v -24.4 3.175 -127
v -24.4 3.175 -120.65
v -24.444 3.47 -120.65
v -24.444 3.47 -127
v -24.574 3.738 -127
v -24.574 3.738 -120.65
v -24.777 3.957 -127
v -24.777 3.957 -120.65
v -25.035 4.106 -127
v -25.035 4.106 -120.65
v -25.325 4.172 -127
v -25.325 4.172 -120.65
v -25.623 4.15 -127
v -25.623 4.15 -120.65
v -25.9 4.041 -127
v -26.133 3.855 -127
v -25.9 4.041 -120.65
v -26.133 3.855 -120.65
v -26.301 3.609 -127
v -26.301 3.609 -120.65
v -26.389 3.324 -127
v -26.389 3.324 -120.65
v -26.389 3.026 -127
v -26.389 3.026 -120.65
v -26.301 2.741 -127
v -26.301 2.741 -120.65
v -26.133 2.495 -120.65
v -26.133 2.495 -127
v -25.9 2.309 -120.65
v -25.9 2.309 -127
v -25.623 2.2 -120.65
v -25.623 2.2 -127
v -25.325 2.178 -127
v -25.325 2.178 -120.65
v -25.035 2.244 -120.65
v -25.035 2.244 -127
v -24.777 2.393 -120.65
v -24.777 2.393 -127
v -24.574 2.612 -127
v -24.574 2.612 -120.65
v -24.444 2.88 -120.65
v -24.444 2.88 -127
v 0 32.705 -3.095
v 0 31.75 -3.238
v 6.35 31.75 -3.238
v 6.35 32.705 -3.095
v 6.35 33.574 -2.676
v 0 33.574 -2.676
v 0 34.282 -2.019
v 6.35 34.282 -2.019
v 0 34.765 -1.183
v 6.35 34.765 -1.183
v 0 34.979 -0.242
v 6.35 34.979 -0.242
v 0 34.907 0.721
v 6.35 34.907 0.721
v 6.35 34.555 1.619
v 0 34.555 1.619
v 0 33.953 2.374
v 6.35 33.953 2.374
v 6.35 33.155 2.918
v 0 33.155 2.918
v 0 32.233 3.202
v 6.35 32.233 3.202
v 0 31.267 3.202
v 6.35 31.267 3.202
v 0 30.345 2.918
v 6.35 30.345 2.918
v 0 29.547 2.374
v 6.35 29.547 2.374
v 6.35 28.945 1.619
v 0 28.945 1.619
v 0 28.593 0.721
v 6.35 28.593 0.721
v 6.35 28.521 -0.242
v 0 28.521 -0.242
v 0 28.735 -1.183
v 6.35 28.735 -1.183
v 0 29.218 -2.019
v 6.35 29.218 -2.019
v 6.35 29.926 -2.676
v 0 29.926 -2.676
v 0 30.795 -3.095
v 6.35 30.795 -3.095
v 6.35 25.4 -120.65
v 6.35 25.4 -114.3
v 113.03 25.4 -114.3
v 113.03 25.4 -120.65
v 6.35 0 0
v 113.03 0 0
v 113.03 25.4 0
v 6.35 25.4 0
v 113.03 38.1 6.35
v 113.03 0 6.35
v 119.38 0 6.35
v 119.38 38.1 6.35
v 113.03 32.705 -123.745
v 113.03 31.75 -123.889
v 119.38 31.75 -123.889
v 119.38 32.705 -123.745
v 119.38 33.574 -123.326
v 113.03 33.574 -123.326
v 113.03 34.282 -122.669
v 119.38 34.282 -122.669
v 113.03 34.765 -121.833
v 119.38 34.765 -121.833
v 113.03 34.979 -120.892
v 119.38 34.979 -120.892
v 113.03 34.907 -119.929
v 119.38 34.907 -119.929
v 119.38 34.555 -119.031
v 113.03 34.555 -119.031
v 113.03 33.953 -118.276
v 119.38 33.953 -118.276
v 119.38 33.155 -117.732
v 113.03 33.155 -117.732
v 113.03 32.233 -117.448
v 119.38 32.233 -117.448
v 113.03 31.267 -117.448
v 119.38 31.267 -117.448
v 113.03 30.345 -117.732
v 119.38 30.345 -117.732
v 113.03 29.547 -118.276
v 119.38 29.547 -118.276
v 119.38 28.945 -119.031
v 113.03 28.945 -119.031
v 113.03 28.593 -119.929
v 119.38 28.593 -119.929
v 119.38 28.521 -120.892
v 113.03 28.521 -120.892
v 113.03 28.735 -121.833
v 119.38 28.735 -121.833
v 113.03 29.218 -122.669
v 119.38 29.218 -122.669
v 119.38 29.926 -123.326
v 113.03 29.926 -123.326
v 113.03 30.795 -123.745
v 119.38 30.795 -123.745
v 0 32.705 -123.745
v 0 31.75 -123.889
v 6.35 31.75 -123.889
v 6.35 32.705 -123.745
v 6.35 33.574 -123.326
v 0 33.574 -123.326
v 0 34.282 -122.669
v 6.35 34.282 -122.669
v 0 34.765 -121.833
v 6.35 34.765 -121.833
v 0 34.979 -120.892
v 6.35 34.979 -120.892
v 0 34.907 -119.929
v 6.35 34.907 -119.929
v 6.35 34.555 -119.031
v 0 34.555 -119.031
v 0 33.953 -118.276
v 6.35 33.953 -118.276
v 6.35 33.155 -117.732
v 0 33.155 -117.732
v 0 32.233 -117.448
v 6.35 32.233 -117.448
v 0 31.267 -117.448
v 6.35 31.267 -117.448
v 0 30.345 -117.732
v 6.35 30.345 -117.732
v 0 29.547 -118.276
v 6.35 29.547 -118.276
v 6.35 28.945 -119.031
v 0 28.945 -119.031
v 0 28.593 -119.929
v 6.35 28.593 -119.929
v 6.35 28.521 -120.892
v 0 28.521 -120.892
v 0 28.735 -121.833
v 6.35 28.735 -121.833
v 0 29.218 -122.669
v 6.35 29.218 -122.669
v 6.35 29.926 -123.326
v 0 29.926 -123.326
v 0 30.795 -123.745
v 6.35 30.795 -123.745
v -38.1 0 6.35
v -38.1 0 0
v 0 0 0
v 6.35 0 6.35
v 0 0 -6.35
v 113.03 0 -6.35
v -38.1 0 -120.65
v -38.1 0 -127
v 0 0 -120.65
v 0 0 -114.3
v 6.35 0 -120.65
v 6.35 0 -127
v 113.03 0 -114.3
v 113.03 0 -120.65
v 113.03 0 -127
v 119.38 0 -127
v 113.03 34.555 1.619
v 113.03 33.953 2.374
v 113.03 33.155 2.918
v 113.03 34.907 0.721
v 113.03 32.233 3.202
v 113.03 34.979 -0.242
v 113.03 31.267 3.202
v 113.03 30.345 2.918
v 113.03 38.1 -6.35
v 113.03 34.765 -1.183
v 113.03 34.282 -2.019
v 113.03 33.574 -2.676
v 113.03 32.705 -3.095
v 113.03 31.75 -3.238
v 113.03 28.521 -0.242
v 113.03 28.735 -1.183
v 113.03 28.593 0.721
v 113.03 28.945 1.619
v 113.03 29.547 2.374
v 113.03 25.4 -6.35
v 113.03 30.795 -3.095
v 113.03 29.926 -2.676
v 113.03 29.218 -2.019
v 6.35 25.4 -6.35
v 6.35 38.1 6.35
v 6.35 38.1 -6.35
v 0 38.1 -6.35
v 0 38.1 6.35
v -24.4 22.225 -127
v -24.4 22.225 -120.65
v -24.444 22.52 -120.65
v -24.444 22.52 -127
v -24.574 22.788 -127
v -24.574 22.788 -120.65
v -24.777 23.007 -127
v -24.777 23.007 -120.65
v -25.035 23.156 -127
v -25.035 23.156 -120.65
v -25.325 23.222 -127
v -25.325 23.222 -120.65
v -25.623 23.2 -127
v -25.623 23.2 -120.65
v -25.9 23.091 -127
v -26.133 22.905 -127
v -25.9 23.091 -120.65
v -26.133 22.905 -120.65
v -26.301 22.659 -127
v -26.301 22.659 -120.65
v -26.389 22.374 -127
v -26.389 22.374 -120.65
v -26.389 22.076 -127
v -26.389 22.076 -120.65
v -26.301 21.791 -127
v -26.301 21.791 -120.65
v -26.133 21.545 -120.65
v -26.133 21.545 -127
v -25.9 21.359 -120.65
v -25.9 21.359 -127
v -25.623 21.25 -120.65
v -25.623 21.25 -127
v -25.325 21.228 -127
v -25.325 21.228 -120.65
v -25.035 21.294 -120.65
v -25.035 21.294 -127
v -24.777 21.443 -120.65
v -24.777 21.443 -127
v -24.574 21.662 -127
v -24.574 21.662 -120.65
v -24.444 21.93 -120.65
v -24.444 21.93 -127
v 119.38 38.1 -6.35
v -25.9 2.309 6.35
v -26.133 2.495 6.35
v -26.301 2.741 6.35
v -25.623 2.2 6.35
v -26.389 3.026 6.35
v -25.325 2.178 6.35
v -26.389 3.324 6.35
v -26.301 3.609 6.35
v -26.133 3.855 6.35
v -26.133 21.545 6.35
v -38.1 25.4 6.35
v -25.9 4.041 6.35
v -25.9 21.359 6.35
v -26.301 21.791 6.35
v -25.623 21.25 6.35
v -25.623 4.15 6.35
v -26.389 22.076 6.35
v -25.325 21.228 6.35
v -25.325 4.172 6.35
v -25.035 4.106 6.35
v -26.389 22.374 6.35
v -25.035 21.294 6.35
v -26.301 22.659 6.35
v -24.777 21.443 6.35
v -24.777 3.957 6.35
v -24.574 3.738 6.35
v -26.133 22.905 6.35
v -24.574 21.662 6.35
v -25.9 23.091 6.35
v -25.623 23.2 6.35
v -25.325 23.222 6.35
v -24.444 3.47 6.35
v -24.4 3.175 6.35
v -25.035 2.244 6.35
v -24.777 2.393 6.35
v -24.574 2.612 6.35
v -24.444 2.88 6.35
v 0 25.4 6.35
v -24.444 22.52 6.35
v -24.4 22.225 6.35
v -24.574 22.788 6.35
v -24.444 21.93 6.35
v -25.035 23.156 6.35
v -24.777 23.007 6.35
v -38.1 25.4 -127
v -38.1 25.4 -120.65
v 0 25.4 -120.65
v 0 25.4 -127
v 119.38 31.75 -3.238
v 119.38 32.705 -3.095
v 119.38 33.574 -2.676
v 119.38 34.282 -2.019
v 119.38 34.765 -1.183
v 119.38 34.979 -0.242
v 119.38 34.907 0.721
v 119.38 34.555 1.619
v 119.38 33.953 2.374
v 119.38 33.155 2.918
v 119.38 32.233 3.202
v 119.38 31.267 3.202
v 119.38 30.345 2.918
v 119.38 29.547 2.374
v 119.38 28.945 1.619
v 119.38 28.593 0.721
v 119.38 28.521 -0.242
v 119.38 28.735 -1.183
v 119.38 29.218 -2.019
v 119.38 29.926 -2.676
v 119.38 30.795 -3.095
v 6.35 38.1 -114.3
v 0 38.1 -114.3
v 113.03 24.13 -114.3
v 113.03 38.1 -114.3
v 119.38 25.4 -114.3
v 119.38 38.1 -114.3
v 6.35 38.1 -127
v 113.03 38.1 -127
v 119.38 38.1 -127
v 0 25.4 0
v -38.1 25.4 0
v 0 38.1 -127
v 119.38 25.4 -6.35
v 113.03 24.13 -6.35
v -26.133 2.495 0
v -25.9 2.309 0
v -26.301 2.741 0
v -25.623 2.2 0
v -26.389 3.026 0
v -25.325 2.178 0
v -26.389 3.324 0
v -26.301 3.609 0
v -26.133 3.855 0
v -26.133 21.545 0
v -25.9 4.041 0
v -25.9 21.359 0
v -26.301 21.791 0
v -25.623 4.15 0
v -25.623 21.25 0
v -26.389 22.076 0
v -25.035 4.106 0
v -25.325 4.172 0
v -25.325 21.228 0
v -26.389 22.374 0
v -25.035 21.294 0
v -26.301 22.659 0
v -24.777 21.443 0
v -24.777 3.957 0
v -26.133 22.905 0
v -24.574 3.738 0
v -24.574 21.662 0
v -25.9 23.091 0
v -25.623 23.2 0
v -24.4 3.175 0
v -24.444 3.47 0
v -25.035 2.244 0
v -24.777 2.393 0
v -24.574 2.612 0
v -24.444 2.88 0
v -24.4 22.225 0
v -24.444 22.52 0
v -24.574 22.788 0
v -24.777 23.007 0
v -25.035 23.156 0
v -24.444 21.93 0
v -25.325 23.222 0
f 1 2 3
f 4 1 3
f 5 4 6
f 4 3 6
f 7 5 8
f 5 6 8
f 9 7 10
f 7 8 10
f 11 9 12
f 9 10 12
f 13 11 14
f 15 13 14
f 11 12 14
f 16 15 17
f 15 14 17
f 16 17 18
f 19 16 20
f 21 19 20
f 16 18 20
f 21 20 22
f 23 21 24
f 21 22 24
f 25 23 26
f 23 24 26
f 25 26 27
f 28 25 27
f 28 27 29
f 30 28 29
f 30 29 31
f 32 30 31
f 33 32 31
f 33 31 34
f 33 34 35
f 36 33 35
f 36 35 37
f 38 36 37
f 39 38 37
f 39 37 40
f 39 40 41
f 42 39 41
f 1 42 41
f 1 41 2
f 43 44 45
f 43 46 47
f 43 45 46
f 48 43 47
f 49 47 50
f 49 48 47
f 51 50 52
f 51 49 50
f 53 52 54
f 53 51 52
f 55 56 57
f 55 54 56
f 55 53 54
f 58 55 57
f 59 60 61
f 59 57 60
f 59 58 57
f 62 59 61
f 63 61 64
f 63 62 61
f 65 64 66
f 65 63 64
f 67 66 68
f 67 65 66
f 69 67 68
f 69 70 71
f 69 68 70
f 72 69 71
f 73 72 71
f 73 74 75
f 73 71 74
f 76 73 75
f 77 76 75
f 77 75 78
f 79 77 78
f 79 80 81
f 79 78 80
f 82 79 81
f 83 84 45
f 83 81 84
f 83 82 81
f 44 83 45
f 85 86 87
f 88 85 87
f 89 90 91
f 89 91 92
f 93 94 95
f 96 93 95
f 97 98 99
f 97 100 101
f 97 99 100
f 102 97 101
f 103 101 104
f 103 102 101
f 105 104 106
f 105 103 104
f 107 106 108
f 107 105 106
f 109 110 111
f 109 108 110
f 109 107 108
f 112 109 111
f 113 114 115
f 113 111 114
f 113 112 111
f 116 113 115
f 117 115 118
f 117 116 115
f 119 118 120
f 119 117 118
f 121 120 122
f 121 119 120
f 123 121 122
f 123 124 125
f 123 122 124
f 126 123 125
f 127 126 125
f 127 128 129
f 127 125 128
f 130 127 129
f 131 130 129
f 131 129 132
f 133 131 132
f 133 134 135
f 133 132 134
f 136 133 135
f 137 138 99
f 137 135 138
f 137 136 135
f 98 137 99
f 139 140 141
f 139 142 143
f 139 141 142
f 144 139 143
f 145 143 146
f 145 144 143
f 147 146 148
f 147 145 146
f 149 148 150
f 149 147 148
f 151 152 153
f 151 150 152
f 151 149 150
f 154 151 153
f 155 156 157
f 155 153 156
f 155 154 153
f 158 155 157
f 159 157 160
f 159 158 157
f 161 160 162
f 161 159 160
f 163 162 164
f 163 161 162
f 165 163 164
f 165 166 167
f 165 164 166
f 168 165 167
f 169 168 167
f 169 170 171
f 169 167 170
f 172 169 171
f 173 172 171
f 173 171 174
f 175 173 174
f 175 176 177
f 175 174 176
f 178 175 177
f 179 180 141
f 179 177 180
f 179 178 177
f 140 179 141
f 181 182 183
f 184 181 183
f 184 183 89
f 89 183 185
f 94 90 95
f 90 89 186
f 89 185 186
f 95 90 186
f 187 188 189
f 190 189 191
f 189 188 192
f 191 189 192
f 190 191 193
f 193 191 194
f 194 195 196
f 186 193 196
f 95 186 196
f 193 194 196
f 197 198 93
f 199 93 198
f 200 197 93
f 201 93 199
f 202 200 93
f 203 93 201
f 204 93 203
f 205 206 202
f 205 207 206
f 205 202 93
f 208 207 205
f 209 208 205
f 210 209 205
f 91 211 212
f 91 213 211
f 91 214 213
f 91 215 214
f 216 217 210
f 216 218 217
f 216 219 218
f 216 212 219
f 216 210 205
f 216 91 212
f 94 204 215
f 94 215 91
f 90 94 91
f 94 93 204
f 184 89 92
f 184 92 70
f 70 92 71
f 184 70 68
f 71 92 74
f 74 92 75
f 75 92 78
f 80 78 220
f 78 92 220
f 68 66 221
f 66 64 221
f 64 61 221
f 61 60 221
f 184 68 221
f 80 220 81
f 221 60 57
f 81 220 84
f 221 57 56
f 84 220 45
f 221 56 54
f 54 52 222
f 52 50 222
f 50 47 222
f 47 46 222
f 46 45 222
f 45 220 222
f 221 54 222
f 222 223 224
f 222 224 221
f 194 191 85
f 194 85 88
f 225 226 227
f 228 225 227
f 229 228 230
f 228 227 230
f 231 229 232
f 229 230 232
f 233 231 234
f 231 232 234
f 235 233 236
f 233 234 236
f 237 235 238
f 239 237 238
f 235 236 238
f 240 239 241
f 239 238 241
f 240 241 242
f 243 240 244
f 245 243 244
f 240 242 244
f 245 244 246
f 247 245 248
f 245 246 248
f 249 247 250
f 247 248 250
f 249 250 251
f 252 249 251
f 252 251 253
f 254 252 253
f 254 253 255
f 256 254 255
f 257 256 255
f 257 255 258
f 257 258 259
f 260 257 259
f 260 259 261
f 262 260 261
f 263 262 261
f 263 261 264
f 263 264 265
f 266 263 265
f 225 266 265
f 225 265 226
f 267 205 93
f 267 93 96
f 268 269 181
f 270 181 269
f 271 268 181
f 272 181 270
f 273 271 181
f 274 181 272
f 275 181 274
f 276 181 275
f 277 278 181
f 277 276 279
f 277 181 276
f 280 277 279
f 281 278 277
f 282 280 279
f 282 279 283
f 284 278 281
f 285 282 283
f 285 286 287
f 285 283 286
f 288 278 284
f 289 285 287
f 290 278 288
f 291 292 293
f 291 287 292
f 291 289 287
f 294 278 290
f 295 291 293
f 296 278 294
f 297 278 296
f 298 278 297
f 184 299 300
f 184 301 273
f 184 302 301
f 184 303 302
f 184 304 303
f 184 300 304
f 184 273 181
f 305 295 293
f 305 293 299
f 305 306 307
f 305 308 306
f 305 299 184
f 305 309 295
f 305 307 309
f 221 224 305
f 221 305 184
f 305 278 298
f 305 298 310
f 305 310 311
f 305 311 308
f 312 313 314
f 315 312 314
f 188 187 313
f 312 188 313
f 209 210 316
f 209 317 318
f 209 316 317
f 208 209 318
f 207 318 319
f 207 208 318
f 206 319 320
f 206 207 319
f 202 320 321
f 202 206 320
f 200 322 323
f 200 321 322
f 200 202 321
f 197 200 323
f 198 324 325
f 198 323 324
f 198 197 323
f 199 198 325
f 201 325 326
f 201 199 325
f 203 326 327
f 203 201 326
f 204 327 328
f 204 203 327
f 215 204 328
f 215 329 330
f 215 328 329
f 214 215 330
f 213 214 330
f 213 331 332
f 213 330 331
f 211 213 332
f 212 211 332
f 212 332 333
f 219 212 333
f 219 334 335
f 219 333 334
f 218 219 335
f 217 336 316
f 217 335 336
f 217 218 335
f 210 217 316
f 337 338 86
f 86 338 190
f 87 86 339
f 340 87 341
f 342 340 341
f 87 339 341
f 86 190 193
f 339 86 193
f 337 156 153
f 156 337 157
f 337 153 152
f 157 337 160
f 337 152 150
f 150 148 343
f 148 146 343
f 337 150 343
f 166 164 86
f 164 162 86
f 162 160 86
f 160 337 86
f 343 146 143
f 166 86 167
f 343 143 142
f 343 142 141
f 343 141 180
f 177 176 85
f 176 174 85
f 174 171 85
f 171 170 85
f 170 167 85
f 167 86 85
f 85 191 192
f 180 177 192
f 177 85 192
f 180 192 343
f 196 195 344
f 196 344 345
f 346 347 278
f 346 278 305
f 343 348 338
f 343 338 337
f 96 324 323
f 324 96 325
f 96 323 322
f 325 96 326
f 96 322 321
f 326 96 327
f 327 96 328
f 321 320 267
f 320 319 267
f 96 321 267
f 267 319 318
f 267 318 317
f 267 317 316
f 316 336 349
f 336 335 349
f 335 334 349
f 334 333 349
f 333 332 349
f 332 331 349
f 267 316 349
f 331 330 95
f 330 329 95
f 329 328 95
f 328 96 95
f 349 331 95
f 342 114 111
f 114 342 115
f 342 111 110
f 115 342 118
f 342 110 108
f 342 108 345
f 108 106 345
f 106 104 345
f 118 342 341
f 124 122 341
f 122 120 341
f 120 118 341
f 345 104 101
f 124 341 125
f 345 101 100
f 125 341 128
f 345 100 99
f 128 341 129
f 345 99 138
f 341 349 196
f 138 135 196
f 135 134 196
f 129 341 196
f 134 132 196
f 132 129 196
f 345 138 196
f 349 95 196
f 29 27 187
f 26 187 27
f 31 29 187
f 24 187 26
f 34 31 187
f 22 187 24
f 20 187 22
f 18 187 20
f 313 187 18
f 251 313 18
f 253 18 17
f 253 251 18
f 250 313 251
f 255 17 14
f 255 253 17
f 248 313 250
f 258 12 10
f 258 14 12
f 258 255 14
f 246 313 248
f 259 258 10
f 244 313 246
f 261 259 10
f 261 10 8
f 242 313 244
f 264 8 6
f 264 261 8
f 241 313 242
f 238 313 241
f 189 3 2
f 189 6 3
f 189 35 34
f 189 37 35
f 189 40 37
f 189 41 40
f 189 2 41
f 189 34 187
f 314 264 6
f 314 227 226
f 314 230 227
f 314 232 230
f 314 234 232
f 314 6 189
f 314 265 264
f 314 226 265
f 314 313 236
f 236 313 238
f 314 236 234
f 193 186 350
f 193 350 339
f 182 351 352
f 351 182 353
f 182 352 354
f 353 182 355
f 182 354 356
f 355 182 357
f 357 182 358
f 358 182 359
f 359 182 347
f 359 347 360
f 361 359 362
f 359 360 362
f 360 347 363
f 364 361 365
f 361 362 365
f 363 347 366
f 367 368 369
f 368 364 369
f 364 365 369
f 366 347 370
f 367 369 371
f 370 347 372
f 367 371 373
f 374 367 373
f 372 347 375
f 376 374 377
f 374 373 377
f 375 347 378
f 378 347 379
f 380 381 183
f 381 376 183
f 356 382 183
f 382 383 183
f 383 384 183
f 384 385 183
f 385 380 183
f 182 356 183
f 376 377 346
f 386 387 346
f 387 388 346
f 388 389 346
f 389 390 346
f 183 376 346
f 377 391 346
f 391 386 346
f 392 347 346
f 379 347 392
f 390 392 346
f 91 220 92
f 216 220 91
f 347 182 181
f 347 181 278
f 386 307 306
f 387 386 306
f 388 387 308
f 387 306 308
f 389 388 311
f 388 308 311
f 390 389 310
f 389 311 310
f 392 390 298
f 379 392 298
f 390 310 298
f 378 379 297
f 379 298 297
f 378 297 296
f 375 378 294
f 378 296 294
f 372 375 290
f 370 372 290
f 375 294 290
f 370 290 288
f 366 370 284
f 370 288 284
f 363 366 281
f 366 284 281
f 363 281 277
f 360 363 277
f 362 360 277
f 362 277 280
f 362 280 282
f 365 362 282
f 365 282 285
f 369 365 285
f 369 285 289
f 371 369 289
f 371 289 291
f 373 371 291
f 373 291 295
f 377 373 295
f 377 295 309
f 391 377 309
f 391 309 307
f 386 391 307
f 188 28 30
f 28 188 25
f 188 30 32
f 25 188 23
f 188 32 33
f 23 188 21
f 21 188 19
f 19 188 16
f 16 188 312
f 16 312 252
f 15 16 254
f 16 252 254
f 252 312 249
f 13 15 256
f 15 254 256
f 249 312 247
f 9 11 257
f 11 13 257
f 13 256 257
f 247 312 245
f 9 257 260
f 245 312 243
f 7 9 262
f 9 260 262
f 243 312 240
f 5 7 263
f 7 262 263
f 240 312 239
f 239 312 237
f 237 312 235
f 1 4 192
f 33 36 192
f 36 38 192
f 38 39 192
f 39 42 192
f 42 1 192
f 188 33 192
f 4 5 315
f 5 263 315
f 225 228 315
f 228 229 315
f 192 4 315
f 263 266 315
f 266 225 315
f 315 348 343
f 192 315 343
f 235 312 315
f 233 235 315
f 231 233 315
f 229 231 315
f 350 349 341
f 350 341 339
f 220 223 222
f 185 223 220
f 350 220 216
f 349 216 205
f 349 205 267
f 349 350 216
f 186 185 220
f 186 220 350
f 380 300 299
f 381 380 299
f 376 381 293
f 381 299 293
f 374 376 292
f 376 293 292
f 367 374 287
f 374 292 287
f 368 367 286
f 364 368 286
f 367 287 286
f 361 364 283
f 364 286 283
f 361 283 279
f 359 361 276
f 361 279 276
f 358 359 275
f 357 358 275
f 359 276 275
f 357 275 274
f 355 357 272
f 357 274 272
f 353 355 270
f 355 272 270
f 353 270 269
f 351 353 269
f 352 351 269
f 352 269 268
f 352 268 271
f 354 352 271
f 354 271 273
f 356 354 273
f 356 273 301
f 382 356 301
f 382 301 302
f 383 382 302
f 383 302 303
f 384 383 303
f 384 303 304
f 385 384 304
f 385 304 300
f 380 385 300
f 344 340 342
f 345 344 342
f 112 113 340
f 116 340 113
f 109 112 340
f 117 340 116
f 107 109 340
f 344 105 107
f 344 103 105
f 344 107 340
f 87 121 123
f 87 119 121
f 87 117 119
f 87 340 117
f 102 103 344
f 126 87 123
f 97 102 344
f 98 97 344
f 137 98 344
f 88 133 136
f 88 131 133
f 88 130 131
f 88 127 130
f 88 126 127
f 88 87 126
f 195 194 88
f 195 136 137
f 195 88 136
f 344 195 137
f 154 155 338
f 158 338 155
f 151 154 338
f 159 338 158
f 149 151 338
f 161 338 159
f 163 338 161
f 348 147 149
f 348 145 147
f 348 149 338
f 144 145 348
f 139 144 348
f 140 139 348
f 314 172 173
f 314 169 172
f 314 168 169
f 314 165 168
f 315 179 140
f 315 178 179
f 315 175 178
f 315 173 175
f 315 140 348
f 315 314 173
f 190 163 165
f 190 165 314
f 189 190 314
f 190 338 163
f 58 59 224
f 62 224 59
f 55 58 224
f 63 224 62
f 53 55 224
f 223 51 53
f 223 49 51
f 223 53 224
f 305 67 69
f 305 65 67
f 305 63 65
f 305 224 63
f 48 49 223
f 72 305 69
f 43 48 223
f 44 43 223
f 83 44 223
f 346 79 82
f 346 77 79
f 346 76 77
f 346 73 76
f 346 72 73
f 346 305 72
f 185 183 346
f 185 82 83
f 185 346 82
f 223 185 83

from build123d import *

# Parameters (mm, degrees)
BOSS_EXTRUDE1_DEPTH     = 25.4
CUT_EXTRUDE1_START      = -6.35
CUT_EXTRUDE1_DEPTH      = 107.95
SKETCH3_W               = 44.45
SKETCH3_H               = 25.4
BOSS_EXTRUDE2_DEPTH     = 6.35
BOSS_EXTRUDE3_START     = -120.65
SKETCH3_2_W             = 44.45
SKETCH3_2_H             = 25.4
BOSS_EXTRUDE3_DEPTH     = 6.35
BOSS_EXTRUDE4_START     = -25.4
SKETCH8_W               = 6.35
SKETCH8_H               = 12.7
BOSS_EXTRUDE4_DEPTH     = 38.1
CUT_EXTRUDE2_DEPTH      = 206.865393886
CUT_EXTRUDE2_DEPTH_BACK = 206.865393886
SKETCH9_R               = 3.2385
SKETCH10_R              = 1.000000032
CUT_EXTRUDE3_DEPTH      = 183.990209847


with BuildPart() as part:
    # Sketch1 → Boss-Extrude1 (new body)
    with BuildSketch(Plane(origin=(0, 0, 0), x_dir=(1, 0, 0), z_dir=(0, 1, 0))):
        Polygon((3.175, 114.3), (0, 114.3), (0, 120.65), (119.38, 120.65), (119.38, 0), (0, 0), (0, 6.35), (3.175, 6.35), (113.03, 6.35), (113.03, 114.3), align=None)
    extrude(amount=BOSS_EXTRUDE1_DEPTH)

    # Sketch2 → Cut-Extrude1 (cut)
    with BuildSketch(Plane.XY.offset(CUT_EXTRUDE1_START)):
        Polygon((119.38, 25.4), (113.03, 24.13), (113.03, 25.4), align=None)
    extrude(amount=-CUT_EXTRUDE1_DEPTH, mode=Mode.SUBTRACT)

    # Sketch3 → Boss-Extrude2 (add)
    with BuildSketch(Plane.XY):
        with Locations((-15.875, 12.7)):
            Rectangle(SKETCH3_W, SKETCH3_H)
    extrude(amount=BOSS_EXTRUDE2_DEPTH)

    # Sketch3<2> → Boss-Extrude3 (add)
    with BuildSketch(Plane.XY.offset(BOSS_EXTRUDE3_START)):
        with Locations((-15.875, 12.7)):
            Rectangle(SKETCH3_2_W, SKETCH3_2_H)
    extrude(amount=-BOSS_EXTRUDE3_DEPTH)

    # Sketch8 → Boss-Extrude4 (add)
    with BuildSketch(Plane(origin=(0, 25.4, 0), x_dir=(1, 0, 0), z_dir=(0, 1, 0)).offset(BOSS_EXTRUDE4_START)):
        with Locations((116.205, 0)):
            Rectangle(SKETCH8_W, SKETCH8_H)
        with Locations((3.175, 0)):
            Rectangle(SKETCH8_W, SKETCH8_H)
        with Locations((3.175, 120.65)):
            Rectangle(SKETCH8_W, SKETCH8_H)
        with Locations((116.205, 120.65)):
            Rectangle(SKETCH8_W, SKETCH8_H)
    extrude(amount=BOSS_EXTRUDE4_DEPTH)

    # Sketch9 → Cut-Extrude2 (cut, two sides: drawn at the far end of the back side and taken through both)
    with BuildSketch(Plane(origin=(119.38, 0, 0), x_dir=(0, 0, -1), z_dir=(1, 0, 0)).offset(-CUT_EXTRUDE2_DEPTH_BACK)):
        with Locations((0, 31.75)):
            Circle(SKETCH9_R)
        with Locations((120.65, 31.75)):
            Circle(SKETCH9_R)
    extrude(amount=CUT_EXTRUDE2_DEPTH + CUT_EXTRUDE2_DEPTH_BACK, mode=Mode.SUBTRACT)

    # Sketch10 → Cut-Extrude3 (cut, through all)
    with BuildSketch(Plane.XY.offset(6.35)):
        with Locations((-25.4, 22.225)):
            Circle(SKETCH10_R)
        with Locations((-25.4, 3.175)):
            Circle(SKETCH10_R)
    extrude(amount=-CUT_EXTRUDE3_DEPTH, mode=Mode.SUBTRACT)


solid = part.part
